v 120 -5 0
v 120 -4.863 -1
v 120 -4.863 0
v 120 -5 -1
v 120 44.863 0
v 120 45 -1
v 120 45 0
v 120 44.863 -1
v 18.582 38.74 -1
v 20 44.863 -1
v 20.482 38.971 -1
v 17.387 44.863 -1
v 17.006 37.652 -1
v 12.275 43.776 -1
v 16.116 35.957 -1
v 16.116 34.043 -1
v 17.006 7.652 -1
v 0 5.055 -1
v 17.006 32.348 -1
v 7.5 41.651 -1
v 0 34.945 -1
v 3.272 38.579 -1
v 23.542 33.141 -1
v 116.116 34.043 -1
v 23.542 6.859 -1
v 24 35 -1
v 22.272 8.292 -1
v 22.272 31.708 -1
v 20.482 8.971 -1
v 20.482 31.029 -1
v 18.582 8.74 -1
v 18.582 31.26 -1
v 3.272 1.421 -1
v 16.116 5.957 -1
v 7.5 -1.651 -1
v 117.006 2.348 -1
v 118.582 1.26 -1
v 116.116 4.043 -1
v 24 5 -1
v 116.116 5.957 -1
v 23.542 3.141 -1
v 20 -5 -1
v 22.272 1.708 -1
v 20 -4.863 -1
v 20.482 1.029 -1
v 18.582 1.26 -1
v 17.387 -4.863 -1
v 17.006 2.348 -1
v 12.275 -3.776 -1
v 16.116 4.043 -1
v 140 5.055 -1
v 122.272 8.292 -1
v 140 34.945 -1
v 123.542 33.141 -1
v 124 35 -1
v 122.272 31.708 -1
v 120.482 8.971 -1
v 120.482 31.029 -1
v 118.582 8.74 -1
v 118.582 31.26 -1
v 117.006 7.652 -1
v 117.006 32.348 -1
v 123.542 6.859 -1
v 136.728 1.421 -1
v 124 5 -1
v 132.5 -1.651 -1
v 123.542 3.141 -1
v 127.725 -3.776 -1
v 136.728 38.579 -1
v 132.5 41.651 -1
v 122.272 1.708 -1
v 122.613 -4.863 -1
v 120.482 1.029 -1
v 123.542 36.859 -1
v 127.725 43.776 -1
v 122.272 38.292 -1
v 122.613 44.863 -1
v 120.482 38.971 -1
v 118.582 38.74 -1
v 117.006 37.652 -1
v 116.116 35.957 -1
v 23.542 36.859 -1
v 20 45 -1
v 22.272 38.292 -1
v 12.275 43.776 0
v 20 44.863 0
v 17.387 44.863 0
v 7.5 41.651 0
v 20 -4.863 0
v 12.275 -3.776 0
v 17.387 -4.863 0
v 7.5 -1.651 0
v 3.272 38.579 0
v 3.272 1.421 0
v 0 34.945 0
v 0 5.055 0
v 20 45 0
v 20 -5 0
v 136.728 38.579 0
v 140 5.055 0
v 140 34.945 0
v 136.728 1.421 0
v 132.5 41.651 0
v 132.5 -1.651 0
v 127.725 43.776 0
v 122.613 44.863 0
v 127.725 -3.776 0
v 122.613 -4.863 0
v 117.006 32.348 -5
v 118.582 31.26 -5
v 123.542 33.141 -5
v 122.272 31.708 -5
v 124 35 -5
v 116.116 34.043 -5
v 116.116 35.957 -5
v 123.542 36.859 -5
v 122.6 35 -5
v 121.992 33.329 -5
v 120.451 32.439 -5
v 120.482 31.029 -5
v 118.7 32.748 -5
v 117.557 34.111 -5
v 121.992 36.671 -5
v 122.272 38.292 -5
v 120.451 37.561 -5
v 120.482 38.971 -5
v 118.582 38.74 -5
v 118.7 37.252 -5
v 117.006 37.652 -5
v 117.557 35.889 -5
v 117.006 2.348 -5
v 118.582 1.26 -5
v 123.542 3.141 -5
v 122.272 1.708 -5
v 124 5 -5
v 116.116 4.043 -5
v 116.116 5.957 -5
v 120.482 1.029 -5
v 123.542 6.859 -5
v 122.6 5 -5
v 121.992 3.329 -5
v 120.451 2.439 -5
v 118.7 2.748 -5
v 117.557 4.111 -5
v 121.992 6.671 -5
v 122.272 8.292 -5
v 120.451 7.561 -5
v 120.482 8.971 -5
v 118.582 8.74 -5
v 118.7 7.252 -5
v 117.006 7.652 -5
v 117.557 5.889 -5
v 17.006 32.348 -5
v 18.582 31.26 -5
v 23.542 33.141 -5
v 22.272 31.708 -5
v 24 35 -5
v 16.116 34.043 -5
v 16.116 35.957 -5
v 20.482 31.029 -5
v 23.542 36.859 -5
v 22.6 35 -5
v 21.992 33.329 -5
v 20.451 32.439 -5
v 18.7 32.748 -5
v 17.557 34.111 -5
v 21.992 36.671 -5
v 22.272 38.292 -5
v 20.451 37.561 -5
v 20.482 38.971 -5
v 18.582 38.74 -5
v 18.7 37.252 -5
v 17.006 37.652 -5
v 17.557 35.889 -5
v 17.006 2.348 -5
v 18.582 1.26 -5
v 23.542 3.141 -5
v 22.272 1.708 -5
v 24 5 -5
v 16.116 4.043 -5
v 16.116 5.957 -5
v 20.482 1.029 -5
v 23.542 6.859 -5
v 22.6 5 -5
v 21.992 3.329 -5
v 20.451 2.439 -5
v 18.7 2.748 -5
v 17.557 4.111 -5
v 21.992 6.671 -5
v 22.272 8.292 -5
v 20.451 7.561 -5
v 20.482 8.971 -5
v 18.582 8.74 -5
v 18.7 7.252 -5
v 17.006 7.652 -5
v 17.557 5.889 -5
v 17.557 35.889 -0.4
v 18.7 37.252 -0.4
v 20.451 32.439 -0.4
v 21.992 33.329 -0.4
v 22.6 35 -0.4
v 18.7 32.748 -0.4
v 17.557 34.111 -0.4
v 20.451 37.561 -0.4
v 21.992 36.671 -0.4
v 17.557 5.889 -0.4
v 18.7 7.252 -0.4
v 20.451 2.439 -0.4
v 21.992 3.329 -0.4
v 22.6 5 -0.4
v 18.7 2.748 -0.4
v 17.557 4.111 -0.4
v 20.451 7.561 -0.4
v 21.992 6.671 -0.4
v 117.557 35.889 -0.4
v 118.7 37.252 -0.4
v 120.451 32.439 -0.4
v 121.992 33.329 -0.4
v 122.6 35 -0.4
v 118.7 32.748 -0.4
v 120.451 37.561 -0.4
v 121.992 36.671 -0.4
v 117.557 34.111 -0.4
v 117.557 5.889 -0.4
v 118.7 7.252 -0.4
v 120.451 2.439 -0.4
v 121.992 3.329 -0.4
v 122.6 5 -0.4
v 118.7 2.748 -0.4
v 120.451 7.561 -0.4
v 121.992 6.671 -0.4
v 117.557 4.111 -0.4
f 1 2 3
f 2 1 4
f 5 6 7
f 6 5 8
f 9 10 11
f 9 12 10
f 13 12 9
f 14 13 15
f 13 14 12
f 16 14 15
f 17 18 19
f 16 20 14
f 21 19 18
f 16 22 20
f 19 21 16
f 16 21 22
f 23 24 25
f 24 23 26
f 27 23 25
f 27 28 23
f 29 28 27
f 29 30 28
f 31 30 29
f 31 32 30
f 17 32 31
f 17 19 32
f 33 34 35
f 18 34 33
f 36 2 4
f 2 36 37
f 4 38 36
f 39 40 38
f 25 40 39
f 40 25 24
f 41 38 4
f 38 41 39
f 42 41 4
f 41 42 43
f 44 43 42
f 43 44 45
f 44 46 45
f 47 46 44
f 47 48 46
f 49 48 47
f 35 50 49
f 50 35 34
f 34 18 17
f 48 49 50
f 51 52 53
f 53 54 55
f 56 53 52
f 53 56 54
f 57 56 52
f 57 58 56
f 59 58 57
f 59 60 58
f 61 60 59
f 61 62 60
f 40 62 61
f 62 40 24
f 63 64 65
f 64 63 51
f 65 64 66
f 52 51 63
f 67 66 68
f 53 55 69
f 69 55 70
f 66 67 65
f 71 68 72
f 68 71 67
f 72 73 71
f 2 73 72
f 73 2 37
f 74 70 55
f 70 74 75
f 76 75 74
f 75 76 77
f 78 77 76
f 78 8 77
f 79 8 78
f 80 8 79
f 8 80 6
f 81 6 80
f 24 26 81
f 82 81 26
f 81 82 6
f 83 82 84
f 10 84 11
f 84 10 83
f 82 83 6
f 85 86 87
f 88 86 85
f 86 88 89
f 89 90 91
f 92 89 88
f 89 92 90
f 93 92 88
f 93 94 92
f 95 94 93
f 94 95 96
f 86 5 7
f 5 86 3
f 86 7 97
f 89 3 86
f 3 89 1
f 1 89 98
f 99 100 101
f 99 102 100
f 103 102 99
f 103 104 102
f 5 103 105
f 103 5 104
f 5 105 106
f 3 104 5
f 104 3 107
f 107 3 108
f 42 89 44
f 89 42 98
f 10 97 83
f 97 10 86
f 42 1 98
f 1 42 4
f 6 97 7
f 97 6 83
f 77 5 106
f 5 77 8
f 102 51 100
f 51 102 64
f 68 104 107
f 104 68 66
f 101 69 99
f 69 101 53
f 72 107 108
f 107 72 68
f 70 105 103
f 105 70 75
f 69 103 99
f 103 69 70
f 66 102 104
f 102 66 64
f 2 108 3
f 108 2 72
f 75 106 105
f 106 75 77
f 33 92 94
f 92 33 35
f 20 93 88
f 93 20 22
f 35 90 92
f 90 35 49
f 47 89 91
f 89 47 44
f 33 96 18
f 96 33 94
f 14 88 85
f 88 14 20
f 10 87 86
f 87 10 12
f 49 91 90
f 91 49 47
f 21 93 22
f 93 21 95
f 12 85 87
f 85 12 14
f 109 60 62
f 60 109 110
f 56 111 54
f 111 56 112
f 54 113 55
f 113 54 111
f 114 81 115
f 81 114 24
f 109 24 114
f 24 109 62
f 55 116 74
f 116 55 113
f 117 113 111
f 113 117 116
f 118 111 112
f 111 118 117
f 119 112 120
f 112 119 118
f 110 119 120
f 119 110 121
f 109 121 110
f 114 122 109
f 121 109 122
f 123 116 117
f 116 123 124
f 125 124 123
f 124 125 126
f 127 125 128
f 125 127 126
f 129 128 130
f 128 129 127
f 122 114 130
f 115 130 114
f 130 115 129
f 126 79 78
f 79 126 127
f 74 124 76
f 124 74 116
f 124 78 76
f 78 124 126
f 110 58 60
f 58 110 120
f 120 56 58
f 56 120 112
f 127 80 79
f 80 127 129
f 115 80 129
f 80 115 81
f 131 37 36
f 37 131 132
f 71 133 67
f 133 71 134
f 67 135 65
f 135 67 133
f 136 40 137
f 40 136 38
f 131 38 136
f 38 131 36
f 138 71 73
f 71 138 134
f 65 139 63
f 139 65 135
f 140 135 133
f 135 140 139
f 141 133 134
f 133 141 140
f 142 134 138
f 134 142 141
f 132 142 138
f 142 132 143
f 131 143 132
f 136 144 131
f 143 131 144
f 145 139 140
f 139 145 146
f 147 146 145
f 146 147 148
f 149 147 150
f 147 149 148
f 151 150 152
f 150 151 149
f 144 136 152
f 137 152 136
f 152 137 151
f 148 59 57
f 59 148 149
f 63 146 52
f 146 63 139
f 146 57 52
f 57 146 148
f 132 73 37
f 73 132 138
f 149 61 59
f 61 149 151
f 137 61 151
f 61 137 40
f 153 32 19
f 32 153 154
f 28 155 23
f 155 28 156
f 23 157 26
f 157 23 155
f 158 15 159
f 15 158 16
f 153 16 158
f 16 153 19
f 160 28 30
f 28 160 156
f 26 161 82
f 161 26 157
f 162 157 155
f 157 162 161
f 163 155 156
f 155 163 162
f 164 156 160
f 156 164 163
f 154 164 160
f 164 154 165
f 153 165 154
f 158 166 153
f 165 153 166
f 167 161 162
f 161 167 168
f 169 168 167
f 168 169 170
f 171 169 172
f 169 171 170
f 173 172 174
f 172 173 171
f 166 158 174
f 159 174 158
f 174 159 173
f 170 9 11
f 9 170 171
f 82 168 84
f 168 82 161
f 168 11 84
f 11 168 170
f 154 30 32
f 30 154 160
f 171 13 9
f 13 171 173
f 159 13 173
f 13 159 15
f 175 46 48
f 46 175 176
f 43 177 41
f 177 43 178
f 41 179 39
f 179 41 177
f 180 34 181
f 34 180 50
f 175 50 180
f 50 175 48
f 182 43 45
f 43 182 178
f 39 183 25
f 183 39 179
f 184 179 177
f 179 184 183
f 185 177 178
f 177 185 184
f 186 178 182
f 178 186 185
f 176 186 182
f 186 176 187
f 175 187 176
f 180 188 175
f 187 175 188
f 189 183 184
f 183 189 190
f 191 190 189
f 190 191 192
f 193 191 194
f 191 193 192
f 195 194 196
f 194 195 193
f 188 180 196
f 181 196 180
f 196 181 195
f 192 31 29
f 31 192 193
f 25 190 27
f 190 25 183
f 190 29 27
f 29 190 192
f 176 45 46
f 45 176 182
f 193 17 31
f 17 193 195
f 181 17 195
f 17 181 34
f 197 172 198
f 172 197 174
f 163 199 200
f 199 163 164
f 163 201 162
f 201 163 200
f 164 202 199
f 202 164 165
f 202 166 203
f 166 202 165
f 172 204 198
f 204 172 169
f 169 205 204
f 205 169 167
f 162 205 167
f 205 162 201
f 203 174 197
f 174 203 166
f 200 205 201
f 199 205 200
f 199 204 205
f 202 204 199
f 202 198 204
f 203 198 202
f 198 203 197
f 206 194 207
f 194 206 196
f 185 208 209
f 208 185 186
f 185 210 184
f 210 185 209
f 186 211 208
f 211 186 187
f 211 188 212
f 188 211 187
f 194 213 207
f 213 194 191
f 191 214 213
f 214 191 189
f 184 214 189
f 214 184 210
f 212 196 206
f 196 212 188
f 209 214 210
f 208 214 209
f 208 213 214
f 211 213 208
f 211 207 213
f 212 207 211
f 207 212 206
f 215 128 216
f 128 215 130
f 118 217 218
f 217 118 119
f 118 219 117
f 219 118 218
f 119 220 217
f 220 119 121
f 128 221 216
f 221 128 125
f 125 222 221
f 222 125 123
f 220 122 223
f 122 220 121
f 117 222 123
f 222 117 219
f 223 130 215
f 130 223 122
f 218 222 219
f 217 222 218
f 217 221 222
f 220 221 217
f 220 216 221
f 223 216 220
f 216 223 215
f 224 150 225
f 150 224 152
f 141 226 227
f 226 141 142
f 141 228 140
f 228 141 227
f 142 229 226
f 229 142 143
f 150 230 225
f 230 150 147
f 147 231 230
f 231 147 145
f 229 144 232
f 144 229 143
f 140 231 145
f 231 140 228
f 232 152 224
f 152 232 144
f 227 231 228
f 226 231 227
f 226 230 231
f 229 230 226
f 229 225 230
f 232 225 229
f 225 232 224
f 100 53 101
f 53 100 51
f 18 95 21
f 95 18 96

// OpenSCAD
 rotate([0,900,180]) translate([20,-45,0])
difference(){  
 union(){  

  cube([100,50,1]);
   translate([100,25,0]) cylinder(1,25,25);
    translate([0,25,0]) cylinder(1,25,25);
  
  translate([100,10,0]) cylinder(5,4,4);
  translate([100,40,0]) cylinder(5,4,4);
  translate([0,10,0]) cylinder(5,4,4);
  translate([0,40,0]) cylinder(5,4,4);
}
  

  #translate([0,10,0.4]) cylinder(5,2.6,2.6);
  #translate([0,40,0.4]) cylinder(5,2.6,2.6);
  #translate([100,10,0.4]) cylinder(5,2.6,2.6);
  #translate([100,40,0.4]) cylinder(5,2.6,2.6);
  translate([120,0,-2]) cube([5,50,9]);
  translate([-25,0,-2]) cube([5,50,9]);
  
}
